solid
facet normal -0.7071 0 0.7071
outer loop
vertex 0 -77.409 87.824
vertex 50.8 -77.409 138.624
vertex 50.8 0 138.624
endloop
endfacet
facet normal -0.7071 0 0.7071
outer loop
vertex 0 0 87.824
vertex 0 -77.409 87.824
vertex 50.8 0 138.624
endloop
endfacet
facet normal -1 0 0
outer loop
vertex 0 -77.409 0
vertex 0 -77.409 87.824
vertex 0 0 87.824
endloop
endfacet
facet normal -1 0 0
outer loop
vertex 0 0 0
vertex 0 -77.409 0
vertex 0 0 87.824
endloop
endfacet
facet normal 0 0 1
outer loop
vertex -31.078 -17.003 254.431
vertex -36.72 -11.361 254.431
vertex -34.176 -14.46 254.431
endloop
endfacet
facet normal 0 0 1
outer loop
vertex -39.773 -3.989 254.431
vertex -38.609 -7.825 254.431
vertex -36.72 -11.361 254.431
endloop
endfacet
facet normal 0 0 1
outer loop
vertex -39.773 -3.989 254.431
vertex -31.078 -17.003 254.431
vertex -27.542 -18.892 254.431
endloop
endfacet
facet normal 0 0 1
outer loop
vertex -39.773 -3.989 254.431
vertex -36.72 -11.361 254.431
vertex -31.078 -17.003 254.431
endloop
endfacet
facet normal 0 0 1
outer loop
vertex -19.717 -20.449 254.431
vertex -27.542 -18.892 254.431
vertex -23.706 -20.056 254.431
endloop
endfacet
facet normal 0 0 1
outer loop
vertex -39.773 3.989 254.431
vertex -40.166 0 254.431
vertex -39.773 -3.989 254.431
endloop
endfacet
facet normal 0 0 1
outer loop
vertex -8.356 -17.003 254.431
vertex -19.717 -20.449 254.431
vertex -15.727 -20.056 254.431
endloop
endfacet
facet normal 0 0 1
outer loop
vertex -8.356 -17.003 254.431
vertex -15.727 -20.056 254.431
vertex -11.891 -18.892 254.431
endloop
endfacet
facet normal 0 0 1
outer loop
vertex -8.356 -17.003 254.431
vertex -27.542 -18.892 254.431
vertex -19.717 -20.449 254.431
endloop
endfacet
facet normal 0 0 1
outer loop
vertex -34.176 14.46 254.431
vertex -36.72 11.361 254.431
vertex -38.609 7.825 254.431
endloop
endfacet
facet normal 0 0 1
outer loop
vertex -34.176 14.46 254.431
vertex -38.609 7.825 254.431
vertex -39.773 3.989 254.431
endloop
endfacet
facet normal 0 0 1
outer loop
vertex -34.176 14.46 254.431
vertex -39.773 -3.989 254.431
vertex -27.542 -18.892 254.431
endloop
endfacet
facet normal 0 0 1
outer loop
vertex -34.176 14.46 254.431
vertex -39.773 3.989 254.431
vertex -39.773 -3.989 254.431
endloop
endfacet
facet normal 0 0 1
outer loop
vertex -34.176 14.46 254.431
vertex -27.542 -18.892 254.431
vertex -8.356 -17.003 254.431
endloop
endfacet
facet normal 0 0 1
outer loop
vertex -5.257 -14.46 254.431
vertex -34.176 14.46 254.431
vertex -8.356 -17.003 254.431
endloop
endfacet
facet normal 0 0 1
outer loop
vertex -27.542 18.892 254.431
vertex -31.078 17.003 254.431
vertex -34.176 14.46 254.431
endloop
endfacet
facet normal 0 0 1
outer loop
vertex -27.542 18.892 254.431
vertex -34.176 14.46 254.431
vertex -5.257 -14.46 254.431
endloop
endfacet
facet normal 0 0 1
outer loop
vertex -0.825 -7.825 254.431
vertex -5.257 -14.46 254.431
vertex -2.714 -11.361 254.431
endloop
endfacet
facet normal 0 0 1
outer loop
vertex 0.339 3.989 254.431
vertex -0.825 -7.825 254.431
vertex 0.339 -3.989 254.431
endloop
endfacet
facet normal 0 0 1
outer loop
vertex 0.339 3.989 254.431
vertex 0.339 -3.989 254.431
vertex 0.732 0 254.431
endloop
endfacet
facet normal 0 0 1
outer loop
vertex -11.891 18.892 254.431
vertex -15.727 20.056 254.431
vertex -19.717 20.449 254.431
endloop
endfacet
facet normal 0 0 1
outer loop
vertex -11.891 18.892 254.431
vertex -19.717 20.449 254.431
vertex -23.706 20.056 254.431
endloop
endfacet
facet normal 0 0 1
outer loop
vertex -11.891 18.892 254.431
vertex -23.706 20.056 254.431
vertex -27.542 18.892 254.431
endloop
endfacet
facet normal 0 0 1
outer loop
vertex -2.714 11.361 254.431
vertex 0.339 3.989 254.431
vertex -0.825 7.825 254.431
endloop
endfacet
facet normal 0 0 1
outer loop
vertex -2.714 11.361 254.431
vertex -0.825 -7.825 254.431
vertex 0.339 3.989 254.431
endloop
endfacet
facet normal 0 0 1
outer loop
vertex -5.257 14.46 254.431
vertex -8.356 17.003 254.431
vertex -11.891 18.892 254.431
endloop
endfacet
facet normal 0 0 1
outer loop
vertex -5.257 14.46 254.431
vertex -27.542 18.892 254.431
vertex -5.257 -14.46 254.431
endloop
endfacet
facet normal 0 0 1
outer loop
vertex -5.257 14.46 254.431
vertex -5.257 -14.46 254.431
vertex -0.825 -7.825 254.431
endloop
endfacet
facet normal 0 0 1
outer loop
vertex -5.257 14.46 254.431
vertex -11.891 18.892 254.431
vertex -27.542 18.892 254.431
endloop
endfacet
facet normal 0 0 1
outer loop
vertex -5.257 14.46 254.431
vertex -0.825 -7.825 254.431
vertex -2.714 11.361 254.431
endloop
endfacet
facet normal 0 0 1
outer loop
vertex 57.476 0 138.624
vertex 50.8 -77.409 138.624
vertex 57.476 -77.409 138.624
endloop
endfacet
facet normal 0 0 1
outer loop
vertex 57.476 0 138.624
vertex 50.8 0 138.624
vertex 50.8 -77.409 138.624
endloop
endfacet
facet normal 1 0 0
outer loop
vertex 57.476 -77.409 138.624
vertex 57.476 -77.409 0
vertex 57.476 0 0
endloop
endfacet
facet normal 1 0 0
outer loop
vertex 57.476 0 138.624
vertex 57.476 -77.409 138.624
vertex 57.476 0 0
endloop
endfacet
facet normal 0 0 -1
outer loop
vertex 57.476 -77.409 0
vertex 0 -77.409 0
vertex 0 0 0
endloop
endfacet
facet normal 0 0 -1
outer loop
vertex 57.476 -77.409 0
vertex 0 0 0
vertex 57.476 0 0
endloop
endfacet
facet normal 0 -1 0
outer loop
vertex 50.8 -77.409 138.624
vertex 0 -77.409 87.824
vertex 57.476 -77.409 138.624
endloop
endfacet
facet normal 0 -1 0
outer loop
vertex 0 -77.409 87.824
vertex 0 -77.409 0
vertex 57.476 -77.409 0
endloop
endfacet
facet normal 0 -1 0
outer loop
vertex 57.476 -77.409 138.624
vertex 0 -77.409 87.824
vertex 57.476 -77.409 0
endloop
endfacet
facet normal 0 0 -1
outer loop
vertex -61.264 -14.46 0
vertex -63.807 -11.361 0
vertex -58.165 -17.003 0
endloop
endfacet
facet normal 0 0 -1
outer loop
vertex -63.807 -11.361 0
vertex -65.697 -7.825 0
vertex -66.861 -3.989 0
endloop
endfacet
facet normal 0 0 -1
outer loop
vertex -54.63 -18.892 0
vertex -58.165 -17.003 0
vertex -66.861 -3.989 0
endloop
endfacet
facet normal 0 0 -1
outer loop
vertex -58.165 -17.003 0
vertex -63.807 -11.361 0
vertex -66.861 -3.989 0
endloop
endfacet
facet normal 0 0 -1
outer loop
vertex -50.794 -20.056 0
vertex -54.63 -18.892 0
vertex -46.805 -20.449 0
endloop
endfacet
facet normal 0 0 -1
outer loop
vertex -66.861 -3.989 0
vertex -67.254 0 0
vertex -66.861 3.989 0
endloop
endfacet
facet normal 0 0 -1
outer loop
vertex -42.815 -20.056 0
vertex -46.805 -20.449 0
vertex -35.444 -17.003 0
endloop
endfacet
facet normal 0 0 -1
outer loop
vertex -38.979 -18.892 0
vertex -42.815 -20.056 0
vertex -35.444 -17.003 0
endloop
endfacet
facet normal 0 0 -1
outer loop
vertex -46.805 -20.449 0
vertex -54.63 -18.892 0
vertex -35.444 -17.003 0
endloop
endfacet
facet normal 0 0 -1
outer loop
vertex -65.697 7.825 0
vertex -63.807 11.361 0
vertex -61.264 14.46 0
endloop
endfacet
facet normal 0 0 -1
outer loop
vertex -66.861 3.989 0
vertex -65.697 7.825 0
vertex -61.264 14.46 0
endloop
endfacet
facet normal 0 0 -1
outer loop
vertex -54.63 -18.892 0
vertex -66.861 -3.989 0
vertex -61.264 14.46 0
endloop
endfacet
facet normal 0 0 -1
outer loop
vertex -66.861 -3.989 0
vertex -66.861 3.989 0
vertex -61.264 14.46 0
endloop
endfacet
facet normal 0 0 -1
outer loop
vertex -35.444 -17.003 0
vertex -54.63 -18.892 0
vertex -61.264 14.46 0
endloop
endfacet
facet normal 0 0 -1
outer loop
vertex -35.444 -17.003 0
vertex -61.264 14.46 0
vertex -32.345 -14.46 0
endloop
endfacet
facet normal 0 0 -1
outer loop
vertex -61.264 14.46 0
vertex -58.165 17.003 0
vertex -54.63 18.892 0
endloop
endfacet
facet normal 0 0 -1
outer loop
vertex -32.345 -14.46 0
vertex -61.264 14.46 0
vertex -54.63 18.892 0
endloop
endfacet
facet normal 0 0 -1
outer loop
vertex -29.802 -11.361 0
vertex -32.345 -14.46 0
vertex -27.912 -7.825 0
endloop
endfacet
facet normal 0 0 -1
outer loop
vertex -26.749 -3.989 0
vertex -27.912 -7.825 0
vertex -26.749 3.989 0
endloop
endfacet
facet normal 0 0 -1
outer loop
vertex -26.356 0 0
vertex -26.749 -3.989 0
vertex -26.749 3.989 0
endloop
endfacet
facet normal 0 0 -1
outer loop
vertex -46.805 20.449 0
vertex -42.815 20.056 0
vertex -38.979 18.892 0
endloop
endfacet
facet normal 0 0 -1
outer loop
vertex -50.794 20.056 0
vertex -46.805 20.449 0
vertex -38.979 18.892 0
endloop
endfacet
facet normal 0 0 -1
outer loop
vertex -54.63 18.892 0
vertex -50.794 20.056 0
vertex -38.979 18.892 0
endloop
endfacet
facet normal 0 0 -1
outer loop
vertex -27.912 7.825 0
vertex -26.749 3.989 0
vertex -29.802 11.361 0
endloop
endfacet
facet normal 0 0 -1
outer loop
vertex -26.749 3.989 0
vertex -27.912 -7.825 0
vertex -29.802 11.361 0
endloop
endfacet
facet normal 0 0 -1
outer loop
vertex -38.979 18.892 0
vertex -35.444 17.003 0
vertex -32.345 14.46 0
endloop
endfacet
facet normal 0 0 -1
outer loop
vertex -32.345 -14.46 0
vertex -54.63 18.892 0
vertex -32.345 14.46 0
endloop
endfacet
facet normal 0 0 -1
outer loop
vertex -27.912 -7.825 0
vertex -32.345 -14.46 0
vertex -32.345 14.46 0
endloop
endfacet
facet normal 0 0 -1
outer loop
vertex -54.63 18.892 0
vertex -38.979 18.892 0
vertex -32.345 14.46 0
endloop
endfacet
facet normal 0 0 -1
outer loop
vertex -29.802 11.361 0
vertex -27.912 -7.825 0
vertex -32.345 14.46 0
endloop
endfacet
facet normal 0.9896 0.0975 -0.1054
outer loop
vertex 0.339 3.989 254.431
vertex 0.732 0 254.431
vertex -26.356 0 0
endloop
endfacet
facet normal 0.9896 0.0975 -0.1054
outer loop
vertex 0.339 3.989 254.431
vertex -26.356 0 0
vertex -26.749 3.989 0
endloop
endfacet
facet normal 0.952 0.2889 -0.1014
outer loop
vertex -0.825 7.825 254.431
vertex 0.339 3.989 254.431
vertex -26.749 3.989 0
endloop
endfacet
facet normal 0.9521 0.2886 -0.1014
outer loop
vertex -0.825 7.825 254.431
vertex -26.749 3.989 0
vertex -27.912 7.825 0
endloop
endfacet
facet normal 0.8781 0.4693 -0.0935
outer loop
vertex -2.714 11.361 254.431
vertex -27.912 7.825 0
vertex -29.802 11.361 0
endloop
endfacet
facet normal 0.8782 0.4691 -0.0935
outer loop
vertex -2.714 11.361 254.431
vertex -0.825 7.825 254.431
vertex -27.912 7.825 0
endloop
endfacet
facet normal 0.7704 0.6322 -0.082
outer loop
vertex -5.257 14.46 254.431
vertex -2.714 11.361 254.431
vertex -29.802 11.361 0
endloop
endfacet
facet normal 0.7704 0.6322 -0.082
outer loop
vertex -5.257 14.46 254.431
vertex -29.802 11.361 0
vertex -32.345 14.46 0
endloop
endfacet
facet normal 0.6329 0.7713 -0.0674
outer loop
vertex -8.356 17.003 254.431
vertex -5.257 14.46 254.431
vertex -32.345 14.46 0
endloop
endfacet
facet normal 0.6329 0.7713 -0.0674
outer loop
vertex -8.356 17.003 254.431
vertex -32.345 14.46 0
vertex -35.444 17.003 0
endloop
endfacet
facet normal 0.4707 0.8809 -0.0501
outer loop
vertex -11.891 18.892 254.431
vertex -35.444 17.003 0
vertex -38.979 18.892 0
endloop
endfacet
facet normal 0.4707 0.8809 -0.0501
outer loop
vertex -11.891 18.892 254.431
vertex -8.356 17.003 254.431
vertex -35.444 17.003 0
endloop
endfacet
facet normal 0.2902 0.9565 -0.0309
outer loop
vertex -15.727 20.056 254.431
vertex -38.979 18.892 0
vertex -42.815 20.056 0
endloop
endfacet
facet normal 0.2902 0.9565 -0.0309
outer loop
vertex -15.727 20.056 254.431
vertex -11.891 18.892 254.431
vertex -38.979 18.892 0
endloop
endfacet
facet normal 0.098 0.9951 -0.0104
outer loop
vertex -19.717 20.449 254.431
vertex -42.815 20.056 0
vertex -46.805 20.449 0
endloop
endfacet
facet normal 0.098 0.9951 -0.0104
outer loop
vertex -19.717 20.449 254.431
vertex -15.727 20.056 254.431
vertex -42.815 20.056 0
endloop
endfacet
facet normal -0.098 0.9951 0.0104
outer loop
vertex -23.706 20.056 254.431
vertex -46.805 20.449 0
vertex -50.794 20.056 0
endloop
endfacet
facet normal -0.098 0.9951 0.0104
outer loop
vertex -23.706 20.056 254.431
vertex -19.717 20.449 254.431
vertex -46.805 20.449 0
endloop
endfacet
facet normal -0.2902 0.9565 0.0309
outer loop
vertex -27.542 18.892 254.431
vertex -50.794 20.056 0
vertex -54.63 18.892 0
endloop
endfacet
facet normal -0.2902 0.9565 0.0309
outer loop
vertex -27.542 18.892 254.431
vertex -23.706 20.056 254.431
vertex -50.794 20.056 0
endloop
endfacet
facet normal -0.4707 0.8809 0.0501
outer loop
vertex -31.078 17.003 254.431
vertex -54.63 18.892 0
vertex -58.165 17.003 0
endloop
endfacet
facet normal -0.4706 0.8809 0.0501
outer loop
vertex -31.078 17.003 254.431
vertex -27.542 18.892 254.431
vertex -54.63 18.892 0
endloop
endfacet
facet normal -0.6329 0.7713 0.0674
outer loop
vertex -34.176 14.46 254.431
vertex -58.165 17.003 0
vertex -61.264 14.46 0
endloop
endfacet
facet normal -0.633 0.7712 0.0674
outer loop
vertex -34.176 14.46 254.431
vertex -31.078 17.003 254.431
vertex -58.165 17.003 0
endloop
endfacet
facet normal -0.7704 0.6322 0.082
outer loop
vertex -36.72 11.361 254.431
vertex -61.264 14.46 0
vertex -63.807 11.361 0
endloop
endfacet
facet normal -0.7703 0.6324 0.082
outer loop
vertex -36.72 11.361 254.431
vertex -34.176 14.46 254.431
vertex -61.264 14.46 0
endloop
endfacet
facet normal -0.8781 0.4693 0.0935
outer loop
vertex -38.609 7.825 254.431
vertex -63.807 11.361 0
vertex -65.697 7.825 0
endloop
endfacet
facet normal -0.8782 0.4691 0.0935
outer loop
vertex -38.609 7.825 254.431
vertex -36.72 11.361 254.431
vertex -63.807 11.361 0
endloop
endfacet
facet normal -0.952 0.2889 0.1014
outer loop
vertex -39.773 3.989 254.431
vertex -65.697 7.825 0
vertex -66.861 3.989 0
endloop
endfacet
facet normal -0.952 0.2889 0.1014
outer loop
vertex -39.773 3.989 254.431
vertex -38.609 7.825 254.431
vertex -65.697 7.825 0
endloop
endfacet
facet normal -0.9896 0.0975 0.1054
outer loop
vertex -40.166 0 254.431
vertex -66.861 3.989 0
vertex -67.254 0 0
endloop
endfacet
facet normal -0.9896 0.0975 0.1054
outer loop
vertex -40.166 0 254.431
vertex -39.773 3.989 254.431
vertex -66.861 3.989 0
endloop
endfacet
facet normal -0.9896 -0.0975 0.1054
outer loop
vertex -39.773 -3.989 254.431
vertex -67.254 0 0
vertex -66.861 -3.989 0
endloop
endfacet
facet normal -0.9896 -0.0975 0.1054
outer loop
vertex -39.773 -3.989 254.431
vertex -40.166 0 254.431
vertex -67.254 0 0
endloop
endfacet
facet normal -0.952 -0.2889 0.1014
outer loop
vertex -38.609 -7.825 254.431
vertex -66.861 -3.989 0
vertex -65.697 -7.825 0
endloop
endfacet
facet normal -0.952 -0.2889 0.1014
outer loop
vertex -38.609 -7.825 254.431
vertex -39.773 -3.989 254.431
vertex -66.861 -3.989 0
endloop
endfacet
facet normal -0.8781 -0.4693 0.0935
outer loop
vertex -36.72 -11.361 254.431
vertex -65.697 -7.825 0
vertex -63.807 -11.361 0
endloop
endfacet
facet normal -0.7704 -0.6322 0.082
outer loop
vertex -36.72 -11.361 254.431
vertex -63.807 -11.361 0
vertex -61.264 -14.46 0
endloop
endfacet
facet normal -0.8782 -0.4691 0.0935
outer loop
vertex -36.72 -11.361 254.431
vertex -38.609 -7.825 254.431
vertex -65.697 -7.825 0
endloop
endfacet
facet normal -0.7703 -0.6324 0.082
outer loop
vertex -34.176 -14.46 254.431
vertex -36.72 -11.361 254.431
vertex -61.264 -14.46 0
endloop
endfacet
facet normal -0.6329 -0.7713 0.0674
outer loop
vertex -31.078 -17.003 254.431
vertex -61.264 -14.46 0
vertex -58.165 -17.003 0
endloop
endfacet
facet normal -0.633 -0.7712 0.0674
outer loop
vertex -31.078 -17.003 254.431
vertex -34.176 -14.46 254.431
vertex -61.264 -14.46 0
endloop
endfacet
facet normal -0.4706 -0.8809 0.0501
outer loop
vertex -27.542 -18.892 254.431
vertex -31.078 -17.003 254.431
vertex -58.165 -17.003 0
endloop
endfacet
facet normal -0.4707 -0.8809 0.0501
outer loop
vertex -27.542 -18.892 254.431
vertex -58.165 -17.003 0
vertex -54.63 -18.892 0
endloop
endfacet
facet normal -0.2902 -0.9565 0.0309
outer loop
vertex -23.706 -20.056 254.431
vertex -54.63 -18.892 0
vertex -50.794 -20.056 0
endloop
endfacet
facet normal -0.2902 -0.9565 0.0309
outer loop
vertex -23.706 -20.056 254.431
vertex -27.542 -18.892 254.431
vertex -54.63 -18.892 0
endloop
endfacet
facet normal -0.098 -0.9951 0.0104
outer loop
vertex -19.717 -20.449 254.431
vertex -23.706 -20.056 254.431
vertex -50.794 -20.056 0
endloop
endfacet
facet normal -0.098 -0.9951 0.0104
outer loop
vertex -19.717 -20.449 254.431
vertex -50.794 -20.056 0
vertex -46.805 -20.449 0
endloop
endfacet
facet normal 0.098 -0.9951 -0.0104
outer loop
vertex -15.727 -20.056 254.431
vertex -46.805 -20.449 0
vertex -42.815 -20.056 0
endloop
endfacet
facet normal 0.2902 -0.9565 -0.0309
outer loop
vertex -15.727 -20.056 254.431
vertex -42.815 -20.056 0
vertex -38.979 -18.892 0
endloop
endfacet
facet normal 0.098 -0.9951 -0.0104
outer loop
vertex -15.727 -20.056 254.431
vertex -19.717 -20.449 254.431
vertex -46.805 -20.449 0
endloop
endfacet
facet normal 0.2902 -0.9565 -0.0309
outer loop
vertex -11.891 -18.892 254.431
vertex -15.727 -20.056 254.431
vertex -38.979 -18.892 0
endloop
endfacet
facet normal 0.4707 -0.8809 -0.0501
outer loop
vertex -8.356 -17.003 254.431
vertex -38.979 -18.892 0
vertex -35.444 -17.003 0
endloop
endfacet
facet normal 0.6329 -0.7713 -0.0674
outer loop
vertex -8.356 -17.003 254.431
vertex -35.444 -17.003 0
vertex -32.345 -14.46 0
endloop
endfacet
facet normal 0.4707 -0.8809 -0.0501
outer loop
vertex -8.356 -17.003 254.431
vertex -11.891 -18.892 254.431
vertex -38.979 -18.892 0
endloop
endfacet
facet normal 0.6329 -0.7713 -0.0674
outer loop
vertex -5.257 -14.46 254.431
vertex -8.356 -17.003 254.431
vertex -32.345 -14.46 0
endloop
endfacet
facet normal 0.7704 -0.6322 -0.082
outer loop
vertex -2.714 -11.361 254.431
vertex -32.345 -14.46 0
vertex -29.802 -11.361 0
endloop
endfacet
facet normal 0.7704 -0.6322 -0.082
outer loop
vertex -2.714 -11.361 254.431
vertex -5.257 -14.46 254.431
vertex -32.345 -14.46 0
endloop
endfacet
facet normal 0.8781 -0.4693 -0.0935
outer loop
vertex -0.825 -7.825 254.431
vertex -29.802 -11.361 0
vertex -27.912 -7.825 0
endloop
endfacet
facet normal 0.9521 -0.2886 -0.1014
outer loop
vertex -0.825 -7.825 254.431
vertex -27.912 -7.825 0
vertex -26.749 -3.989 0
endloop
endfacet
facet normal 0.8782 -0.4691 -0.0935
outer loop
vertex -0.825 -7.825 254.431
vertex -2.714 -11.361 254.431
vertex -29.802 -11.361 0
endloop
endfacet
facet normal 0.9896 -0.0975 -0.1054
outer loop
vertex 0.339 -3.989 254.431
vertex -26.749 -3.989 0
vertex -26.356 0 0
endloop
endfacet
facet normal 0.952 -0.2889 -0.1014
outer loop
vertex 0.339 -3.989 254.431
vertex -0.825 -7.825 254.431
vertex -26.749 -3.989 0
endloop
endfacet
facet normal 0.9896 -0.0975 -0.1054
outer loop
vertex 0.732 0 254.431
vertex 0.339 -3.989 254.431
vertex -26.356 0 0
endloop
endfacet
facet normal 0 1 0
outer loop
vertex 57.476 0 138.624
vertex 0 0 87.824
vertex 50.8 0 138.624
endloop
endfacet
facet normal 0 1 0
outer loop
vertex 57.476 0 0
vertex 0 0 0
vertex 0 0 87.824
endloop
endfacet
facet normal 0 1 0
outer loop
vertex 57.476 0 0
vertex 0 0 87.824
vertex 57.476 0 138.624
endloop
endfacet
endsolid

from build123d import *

# Parameters (mm, degrees)
F0_W     = 57.476174
F0_H     = 77.409141
F1_DEPTH = 138.624266
F2_SIZE  = 50.8
F3_R     = 20.448919


with BuildPart() as f1:
    # F0 (on Top) → F1 (new body)
    with BuildSketch(Plane.XY):
        with Locations((28.738087, -38.70457)):
            Rectangle(F0_W, F0_H)
    extrude(amount=F1_DEPTH)

    # F2
    f2_edges = [f1.edges().sort_by_distance(p)[0] for p in [
        (0, -38.70457, 138.624266),
    ]]
    chamfer(f2_edges, length=F2_SIZE)


with BuildPart() as f5:
    # F5: sweep along a path in F4
    with BuildLine(Plane.XZ) as f5_path:
        Line((-49.221203, 0), (-22.133406, 254.430741))
    # F3 (on Top) → F5 (sweep)
    with BuildSketch(Plane.XY):
        with Locations((-46.804674, 0)):
            Circle(F3_R)
    sweep(path=f5_path.line)


solid = Compound([f1.part, f5.part])
